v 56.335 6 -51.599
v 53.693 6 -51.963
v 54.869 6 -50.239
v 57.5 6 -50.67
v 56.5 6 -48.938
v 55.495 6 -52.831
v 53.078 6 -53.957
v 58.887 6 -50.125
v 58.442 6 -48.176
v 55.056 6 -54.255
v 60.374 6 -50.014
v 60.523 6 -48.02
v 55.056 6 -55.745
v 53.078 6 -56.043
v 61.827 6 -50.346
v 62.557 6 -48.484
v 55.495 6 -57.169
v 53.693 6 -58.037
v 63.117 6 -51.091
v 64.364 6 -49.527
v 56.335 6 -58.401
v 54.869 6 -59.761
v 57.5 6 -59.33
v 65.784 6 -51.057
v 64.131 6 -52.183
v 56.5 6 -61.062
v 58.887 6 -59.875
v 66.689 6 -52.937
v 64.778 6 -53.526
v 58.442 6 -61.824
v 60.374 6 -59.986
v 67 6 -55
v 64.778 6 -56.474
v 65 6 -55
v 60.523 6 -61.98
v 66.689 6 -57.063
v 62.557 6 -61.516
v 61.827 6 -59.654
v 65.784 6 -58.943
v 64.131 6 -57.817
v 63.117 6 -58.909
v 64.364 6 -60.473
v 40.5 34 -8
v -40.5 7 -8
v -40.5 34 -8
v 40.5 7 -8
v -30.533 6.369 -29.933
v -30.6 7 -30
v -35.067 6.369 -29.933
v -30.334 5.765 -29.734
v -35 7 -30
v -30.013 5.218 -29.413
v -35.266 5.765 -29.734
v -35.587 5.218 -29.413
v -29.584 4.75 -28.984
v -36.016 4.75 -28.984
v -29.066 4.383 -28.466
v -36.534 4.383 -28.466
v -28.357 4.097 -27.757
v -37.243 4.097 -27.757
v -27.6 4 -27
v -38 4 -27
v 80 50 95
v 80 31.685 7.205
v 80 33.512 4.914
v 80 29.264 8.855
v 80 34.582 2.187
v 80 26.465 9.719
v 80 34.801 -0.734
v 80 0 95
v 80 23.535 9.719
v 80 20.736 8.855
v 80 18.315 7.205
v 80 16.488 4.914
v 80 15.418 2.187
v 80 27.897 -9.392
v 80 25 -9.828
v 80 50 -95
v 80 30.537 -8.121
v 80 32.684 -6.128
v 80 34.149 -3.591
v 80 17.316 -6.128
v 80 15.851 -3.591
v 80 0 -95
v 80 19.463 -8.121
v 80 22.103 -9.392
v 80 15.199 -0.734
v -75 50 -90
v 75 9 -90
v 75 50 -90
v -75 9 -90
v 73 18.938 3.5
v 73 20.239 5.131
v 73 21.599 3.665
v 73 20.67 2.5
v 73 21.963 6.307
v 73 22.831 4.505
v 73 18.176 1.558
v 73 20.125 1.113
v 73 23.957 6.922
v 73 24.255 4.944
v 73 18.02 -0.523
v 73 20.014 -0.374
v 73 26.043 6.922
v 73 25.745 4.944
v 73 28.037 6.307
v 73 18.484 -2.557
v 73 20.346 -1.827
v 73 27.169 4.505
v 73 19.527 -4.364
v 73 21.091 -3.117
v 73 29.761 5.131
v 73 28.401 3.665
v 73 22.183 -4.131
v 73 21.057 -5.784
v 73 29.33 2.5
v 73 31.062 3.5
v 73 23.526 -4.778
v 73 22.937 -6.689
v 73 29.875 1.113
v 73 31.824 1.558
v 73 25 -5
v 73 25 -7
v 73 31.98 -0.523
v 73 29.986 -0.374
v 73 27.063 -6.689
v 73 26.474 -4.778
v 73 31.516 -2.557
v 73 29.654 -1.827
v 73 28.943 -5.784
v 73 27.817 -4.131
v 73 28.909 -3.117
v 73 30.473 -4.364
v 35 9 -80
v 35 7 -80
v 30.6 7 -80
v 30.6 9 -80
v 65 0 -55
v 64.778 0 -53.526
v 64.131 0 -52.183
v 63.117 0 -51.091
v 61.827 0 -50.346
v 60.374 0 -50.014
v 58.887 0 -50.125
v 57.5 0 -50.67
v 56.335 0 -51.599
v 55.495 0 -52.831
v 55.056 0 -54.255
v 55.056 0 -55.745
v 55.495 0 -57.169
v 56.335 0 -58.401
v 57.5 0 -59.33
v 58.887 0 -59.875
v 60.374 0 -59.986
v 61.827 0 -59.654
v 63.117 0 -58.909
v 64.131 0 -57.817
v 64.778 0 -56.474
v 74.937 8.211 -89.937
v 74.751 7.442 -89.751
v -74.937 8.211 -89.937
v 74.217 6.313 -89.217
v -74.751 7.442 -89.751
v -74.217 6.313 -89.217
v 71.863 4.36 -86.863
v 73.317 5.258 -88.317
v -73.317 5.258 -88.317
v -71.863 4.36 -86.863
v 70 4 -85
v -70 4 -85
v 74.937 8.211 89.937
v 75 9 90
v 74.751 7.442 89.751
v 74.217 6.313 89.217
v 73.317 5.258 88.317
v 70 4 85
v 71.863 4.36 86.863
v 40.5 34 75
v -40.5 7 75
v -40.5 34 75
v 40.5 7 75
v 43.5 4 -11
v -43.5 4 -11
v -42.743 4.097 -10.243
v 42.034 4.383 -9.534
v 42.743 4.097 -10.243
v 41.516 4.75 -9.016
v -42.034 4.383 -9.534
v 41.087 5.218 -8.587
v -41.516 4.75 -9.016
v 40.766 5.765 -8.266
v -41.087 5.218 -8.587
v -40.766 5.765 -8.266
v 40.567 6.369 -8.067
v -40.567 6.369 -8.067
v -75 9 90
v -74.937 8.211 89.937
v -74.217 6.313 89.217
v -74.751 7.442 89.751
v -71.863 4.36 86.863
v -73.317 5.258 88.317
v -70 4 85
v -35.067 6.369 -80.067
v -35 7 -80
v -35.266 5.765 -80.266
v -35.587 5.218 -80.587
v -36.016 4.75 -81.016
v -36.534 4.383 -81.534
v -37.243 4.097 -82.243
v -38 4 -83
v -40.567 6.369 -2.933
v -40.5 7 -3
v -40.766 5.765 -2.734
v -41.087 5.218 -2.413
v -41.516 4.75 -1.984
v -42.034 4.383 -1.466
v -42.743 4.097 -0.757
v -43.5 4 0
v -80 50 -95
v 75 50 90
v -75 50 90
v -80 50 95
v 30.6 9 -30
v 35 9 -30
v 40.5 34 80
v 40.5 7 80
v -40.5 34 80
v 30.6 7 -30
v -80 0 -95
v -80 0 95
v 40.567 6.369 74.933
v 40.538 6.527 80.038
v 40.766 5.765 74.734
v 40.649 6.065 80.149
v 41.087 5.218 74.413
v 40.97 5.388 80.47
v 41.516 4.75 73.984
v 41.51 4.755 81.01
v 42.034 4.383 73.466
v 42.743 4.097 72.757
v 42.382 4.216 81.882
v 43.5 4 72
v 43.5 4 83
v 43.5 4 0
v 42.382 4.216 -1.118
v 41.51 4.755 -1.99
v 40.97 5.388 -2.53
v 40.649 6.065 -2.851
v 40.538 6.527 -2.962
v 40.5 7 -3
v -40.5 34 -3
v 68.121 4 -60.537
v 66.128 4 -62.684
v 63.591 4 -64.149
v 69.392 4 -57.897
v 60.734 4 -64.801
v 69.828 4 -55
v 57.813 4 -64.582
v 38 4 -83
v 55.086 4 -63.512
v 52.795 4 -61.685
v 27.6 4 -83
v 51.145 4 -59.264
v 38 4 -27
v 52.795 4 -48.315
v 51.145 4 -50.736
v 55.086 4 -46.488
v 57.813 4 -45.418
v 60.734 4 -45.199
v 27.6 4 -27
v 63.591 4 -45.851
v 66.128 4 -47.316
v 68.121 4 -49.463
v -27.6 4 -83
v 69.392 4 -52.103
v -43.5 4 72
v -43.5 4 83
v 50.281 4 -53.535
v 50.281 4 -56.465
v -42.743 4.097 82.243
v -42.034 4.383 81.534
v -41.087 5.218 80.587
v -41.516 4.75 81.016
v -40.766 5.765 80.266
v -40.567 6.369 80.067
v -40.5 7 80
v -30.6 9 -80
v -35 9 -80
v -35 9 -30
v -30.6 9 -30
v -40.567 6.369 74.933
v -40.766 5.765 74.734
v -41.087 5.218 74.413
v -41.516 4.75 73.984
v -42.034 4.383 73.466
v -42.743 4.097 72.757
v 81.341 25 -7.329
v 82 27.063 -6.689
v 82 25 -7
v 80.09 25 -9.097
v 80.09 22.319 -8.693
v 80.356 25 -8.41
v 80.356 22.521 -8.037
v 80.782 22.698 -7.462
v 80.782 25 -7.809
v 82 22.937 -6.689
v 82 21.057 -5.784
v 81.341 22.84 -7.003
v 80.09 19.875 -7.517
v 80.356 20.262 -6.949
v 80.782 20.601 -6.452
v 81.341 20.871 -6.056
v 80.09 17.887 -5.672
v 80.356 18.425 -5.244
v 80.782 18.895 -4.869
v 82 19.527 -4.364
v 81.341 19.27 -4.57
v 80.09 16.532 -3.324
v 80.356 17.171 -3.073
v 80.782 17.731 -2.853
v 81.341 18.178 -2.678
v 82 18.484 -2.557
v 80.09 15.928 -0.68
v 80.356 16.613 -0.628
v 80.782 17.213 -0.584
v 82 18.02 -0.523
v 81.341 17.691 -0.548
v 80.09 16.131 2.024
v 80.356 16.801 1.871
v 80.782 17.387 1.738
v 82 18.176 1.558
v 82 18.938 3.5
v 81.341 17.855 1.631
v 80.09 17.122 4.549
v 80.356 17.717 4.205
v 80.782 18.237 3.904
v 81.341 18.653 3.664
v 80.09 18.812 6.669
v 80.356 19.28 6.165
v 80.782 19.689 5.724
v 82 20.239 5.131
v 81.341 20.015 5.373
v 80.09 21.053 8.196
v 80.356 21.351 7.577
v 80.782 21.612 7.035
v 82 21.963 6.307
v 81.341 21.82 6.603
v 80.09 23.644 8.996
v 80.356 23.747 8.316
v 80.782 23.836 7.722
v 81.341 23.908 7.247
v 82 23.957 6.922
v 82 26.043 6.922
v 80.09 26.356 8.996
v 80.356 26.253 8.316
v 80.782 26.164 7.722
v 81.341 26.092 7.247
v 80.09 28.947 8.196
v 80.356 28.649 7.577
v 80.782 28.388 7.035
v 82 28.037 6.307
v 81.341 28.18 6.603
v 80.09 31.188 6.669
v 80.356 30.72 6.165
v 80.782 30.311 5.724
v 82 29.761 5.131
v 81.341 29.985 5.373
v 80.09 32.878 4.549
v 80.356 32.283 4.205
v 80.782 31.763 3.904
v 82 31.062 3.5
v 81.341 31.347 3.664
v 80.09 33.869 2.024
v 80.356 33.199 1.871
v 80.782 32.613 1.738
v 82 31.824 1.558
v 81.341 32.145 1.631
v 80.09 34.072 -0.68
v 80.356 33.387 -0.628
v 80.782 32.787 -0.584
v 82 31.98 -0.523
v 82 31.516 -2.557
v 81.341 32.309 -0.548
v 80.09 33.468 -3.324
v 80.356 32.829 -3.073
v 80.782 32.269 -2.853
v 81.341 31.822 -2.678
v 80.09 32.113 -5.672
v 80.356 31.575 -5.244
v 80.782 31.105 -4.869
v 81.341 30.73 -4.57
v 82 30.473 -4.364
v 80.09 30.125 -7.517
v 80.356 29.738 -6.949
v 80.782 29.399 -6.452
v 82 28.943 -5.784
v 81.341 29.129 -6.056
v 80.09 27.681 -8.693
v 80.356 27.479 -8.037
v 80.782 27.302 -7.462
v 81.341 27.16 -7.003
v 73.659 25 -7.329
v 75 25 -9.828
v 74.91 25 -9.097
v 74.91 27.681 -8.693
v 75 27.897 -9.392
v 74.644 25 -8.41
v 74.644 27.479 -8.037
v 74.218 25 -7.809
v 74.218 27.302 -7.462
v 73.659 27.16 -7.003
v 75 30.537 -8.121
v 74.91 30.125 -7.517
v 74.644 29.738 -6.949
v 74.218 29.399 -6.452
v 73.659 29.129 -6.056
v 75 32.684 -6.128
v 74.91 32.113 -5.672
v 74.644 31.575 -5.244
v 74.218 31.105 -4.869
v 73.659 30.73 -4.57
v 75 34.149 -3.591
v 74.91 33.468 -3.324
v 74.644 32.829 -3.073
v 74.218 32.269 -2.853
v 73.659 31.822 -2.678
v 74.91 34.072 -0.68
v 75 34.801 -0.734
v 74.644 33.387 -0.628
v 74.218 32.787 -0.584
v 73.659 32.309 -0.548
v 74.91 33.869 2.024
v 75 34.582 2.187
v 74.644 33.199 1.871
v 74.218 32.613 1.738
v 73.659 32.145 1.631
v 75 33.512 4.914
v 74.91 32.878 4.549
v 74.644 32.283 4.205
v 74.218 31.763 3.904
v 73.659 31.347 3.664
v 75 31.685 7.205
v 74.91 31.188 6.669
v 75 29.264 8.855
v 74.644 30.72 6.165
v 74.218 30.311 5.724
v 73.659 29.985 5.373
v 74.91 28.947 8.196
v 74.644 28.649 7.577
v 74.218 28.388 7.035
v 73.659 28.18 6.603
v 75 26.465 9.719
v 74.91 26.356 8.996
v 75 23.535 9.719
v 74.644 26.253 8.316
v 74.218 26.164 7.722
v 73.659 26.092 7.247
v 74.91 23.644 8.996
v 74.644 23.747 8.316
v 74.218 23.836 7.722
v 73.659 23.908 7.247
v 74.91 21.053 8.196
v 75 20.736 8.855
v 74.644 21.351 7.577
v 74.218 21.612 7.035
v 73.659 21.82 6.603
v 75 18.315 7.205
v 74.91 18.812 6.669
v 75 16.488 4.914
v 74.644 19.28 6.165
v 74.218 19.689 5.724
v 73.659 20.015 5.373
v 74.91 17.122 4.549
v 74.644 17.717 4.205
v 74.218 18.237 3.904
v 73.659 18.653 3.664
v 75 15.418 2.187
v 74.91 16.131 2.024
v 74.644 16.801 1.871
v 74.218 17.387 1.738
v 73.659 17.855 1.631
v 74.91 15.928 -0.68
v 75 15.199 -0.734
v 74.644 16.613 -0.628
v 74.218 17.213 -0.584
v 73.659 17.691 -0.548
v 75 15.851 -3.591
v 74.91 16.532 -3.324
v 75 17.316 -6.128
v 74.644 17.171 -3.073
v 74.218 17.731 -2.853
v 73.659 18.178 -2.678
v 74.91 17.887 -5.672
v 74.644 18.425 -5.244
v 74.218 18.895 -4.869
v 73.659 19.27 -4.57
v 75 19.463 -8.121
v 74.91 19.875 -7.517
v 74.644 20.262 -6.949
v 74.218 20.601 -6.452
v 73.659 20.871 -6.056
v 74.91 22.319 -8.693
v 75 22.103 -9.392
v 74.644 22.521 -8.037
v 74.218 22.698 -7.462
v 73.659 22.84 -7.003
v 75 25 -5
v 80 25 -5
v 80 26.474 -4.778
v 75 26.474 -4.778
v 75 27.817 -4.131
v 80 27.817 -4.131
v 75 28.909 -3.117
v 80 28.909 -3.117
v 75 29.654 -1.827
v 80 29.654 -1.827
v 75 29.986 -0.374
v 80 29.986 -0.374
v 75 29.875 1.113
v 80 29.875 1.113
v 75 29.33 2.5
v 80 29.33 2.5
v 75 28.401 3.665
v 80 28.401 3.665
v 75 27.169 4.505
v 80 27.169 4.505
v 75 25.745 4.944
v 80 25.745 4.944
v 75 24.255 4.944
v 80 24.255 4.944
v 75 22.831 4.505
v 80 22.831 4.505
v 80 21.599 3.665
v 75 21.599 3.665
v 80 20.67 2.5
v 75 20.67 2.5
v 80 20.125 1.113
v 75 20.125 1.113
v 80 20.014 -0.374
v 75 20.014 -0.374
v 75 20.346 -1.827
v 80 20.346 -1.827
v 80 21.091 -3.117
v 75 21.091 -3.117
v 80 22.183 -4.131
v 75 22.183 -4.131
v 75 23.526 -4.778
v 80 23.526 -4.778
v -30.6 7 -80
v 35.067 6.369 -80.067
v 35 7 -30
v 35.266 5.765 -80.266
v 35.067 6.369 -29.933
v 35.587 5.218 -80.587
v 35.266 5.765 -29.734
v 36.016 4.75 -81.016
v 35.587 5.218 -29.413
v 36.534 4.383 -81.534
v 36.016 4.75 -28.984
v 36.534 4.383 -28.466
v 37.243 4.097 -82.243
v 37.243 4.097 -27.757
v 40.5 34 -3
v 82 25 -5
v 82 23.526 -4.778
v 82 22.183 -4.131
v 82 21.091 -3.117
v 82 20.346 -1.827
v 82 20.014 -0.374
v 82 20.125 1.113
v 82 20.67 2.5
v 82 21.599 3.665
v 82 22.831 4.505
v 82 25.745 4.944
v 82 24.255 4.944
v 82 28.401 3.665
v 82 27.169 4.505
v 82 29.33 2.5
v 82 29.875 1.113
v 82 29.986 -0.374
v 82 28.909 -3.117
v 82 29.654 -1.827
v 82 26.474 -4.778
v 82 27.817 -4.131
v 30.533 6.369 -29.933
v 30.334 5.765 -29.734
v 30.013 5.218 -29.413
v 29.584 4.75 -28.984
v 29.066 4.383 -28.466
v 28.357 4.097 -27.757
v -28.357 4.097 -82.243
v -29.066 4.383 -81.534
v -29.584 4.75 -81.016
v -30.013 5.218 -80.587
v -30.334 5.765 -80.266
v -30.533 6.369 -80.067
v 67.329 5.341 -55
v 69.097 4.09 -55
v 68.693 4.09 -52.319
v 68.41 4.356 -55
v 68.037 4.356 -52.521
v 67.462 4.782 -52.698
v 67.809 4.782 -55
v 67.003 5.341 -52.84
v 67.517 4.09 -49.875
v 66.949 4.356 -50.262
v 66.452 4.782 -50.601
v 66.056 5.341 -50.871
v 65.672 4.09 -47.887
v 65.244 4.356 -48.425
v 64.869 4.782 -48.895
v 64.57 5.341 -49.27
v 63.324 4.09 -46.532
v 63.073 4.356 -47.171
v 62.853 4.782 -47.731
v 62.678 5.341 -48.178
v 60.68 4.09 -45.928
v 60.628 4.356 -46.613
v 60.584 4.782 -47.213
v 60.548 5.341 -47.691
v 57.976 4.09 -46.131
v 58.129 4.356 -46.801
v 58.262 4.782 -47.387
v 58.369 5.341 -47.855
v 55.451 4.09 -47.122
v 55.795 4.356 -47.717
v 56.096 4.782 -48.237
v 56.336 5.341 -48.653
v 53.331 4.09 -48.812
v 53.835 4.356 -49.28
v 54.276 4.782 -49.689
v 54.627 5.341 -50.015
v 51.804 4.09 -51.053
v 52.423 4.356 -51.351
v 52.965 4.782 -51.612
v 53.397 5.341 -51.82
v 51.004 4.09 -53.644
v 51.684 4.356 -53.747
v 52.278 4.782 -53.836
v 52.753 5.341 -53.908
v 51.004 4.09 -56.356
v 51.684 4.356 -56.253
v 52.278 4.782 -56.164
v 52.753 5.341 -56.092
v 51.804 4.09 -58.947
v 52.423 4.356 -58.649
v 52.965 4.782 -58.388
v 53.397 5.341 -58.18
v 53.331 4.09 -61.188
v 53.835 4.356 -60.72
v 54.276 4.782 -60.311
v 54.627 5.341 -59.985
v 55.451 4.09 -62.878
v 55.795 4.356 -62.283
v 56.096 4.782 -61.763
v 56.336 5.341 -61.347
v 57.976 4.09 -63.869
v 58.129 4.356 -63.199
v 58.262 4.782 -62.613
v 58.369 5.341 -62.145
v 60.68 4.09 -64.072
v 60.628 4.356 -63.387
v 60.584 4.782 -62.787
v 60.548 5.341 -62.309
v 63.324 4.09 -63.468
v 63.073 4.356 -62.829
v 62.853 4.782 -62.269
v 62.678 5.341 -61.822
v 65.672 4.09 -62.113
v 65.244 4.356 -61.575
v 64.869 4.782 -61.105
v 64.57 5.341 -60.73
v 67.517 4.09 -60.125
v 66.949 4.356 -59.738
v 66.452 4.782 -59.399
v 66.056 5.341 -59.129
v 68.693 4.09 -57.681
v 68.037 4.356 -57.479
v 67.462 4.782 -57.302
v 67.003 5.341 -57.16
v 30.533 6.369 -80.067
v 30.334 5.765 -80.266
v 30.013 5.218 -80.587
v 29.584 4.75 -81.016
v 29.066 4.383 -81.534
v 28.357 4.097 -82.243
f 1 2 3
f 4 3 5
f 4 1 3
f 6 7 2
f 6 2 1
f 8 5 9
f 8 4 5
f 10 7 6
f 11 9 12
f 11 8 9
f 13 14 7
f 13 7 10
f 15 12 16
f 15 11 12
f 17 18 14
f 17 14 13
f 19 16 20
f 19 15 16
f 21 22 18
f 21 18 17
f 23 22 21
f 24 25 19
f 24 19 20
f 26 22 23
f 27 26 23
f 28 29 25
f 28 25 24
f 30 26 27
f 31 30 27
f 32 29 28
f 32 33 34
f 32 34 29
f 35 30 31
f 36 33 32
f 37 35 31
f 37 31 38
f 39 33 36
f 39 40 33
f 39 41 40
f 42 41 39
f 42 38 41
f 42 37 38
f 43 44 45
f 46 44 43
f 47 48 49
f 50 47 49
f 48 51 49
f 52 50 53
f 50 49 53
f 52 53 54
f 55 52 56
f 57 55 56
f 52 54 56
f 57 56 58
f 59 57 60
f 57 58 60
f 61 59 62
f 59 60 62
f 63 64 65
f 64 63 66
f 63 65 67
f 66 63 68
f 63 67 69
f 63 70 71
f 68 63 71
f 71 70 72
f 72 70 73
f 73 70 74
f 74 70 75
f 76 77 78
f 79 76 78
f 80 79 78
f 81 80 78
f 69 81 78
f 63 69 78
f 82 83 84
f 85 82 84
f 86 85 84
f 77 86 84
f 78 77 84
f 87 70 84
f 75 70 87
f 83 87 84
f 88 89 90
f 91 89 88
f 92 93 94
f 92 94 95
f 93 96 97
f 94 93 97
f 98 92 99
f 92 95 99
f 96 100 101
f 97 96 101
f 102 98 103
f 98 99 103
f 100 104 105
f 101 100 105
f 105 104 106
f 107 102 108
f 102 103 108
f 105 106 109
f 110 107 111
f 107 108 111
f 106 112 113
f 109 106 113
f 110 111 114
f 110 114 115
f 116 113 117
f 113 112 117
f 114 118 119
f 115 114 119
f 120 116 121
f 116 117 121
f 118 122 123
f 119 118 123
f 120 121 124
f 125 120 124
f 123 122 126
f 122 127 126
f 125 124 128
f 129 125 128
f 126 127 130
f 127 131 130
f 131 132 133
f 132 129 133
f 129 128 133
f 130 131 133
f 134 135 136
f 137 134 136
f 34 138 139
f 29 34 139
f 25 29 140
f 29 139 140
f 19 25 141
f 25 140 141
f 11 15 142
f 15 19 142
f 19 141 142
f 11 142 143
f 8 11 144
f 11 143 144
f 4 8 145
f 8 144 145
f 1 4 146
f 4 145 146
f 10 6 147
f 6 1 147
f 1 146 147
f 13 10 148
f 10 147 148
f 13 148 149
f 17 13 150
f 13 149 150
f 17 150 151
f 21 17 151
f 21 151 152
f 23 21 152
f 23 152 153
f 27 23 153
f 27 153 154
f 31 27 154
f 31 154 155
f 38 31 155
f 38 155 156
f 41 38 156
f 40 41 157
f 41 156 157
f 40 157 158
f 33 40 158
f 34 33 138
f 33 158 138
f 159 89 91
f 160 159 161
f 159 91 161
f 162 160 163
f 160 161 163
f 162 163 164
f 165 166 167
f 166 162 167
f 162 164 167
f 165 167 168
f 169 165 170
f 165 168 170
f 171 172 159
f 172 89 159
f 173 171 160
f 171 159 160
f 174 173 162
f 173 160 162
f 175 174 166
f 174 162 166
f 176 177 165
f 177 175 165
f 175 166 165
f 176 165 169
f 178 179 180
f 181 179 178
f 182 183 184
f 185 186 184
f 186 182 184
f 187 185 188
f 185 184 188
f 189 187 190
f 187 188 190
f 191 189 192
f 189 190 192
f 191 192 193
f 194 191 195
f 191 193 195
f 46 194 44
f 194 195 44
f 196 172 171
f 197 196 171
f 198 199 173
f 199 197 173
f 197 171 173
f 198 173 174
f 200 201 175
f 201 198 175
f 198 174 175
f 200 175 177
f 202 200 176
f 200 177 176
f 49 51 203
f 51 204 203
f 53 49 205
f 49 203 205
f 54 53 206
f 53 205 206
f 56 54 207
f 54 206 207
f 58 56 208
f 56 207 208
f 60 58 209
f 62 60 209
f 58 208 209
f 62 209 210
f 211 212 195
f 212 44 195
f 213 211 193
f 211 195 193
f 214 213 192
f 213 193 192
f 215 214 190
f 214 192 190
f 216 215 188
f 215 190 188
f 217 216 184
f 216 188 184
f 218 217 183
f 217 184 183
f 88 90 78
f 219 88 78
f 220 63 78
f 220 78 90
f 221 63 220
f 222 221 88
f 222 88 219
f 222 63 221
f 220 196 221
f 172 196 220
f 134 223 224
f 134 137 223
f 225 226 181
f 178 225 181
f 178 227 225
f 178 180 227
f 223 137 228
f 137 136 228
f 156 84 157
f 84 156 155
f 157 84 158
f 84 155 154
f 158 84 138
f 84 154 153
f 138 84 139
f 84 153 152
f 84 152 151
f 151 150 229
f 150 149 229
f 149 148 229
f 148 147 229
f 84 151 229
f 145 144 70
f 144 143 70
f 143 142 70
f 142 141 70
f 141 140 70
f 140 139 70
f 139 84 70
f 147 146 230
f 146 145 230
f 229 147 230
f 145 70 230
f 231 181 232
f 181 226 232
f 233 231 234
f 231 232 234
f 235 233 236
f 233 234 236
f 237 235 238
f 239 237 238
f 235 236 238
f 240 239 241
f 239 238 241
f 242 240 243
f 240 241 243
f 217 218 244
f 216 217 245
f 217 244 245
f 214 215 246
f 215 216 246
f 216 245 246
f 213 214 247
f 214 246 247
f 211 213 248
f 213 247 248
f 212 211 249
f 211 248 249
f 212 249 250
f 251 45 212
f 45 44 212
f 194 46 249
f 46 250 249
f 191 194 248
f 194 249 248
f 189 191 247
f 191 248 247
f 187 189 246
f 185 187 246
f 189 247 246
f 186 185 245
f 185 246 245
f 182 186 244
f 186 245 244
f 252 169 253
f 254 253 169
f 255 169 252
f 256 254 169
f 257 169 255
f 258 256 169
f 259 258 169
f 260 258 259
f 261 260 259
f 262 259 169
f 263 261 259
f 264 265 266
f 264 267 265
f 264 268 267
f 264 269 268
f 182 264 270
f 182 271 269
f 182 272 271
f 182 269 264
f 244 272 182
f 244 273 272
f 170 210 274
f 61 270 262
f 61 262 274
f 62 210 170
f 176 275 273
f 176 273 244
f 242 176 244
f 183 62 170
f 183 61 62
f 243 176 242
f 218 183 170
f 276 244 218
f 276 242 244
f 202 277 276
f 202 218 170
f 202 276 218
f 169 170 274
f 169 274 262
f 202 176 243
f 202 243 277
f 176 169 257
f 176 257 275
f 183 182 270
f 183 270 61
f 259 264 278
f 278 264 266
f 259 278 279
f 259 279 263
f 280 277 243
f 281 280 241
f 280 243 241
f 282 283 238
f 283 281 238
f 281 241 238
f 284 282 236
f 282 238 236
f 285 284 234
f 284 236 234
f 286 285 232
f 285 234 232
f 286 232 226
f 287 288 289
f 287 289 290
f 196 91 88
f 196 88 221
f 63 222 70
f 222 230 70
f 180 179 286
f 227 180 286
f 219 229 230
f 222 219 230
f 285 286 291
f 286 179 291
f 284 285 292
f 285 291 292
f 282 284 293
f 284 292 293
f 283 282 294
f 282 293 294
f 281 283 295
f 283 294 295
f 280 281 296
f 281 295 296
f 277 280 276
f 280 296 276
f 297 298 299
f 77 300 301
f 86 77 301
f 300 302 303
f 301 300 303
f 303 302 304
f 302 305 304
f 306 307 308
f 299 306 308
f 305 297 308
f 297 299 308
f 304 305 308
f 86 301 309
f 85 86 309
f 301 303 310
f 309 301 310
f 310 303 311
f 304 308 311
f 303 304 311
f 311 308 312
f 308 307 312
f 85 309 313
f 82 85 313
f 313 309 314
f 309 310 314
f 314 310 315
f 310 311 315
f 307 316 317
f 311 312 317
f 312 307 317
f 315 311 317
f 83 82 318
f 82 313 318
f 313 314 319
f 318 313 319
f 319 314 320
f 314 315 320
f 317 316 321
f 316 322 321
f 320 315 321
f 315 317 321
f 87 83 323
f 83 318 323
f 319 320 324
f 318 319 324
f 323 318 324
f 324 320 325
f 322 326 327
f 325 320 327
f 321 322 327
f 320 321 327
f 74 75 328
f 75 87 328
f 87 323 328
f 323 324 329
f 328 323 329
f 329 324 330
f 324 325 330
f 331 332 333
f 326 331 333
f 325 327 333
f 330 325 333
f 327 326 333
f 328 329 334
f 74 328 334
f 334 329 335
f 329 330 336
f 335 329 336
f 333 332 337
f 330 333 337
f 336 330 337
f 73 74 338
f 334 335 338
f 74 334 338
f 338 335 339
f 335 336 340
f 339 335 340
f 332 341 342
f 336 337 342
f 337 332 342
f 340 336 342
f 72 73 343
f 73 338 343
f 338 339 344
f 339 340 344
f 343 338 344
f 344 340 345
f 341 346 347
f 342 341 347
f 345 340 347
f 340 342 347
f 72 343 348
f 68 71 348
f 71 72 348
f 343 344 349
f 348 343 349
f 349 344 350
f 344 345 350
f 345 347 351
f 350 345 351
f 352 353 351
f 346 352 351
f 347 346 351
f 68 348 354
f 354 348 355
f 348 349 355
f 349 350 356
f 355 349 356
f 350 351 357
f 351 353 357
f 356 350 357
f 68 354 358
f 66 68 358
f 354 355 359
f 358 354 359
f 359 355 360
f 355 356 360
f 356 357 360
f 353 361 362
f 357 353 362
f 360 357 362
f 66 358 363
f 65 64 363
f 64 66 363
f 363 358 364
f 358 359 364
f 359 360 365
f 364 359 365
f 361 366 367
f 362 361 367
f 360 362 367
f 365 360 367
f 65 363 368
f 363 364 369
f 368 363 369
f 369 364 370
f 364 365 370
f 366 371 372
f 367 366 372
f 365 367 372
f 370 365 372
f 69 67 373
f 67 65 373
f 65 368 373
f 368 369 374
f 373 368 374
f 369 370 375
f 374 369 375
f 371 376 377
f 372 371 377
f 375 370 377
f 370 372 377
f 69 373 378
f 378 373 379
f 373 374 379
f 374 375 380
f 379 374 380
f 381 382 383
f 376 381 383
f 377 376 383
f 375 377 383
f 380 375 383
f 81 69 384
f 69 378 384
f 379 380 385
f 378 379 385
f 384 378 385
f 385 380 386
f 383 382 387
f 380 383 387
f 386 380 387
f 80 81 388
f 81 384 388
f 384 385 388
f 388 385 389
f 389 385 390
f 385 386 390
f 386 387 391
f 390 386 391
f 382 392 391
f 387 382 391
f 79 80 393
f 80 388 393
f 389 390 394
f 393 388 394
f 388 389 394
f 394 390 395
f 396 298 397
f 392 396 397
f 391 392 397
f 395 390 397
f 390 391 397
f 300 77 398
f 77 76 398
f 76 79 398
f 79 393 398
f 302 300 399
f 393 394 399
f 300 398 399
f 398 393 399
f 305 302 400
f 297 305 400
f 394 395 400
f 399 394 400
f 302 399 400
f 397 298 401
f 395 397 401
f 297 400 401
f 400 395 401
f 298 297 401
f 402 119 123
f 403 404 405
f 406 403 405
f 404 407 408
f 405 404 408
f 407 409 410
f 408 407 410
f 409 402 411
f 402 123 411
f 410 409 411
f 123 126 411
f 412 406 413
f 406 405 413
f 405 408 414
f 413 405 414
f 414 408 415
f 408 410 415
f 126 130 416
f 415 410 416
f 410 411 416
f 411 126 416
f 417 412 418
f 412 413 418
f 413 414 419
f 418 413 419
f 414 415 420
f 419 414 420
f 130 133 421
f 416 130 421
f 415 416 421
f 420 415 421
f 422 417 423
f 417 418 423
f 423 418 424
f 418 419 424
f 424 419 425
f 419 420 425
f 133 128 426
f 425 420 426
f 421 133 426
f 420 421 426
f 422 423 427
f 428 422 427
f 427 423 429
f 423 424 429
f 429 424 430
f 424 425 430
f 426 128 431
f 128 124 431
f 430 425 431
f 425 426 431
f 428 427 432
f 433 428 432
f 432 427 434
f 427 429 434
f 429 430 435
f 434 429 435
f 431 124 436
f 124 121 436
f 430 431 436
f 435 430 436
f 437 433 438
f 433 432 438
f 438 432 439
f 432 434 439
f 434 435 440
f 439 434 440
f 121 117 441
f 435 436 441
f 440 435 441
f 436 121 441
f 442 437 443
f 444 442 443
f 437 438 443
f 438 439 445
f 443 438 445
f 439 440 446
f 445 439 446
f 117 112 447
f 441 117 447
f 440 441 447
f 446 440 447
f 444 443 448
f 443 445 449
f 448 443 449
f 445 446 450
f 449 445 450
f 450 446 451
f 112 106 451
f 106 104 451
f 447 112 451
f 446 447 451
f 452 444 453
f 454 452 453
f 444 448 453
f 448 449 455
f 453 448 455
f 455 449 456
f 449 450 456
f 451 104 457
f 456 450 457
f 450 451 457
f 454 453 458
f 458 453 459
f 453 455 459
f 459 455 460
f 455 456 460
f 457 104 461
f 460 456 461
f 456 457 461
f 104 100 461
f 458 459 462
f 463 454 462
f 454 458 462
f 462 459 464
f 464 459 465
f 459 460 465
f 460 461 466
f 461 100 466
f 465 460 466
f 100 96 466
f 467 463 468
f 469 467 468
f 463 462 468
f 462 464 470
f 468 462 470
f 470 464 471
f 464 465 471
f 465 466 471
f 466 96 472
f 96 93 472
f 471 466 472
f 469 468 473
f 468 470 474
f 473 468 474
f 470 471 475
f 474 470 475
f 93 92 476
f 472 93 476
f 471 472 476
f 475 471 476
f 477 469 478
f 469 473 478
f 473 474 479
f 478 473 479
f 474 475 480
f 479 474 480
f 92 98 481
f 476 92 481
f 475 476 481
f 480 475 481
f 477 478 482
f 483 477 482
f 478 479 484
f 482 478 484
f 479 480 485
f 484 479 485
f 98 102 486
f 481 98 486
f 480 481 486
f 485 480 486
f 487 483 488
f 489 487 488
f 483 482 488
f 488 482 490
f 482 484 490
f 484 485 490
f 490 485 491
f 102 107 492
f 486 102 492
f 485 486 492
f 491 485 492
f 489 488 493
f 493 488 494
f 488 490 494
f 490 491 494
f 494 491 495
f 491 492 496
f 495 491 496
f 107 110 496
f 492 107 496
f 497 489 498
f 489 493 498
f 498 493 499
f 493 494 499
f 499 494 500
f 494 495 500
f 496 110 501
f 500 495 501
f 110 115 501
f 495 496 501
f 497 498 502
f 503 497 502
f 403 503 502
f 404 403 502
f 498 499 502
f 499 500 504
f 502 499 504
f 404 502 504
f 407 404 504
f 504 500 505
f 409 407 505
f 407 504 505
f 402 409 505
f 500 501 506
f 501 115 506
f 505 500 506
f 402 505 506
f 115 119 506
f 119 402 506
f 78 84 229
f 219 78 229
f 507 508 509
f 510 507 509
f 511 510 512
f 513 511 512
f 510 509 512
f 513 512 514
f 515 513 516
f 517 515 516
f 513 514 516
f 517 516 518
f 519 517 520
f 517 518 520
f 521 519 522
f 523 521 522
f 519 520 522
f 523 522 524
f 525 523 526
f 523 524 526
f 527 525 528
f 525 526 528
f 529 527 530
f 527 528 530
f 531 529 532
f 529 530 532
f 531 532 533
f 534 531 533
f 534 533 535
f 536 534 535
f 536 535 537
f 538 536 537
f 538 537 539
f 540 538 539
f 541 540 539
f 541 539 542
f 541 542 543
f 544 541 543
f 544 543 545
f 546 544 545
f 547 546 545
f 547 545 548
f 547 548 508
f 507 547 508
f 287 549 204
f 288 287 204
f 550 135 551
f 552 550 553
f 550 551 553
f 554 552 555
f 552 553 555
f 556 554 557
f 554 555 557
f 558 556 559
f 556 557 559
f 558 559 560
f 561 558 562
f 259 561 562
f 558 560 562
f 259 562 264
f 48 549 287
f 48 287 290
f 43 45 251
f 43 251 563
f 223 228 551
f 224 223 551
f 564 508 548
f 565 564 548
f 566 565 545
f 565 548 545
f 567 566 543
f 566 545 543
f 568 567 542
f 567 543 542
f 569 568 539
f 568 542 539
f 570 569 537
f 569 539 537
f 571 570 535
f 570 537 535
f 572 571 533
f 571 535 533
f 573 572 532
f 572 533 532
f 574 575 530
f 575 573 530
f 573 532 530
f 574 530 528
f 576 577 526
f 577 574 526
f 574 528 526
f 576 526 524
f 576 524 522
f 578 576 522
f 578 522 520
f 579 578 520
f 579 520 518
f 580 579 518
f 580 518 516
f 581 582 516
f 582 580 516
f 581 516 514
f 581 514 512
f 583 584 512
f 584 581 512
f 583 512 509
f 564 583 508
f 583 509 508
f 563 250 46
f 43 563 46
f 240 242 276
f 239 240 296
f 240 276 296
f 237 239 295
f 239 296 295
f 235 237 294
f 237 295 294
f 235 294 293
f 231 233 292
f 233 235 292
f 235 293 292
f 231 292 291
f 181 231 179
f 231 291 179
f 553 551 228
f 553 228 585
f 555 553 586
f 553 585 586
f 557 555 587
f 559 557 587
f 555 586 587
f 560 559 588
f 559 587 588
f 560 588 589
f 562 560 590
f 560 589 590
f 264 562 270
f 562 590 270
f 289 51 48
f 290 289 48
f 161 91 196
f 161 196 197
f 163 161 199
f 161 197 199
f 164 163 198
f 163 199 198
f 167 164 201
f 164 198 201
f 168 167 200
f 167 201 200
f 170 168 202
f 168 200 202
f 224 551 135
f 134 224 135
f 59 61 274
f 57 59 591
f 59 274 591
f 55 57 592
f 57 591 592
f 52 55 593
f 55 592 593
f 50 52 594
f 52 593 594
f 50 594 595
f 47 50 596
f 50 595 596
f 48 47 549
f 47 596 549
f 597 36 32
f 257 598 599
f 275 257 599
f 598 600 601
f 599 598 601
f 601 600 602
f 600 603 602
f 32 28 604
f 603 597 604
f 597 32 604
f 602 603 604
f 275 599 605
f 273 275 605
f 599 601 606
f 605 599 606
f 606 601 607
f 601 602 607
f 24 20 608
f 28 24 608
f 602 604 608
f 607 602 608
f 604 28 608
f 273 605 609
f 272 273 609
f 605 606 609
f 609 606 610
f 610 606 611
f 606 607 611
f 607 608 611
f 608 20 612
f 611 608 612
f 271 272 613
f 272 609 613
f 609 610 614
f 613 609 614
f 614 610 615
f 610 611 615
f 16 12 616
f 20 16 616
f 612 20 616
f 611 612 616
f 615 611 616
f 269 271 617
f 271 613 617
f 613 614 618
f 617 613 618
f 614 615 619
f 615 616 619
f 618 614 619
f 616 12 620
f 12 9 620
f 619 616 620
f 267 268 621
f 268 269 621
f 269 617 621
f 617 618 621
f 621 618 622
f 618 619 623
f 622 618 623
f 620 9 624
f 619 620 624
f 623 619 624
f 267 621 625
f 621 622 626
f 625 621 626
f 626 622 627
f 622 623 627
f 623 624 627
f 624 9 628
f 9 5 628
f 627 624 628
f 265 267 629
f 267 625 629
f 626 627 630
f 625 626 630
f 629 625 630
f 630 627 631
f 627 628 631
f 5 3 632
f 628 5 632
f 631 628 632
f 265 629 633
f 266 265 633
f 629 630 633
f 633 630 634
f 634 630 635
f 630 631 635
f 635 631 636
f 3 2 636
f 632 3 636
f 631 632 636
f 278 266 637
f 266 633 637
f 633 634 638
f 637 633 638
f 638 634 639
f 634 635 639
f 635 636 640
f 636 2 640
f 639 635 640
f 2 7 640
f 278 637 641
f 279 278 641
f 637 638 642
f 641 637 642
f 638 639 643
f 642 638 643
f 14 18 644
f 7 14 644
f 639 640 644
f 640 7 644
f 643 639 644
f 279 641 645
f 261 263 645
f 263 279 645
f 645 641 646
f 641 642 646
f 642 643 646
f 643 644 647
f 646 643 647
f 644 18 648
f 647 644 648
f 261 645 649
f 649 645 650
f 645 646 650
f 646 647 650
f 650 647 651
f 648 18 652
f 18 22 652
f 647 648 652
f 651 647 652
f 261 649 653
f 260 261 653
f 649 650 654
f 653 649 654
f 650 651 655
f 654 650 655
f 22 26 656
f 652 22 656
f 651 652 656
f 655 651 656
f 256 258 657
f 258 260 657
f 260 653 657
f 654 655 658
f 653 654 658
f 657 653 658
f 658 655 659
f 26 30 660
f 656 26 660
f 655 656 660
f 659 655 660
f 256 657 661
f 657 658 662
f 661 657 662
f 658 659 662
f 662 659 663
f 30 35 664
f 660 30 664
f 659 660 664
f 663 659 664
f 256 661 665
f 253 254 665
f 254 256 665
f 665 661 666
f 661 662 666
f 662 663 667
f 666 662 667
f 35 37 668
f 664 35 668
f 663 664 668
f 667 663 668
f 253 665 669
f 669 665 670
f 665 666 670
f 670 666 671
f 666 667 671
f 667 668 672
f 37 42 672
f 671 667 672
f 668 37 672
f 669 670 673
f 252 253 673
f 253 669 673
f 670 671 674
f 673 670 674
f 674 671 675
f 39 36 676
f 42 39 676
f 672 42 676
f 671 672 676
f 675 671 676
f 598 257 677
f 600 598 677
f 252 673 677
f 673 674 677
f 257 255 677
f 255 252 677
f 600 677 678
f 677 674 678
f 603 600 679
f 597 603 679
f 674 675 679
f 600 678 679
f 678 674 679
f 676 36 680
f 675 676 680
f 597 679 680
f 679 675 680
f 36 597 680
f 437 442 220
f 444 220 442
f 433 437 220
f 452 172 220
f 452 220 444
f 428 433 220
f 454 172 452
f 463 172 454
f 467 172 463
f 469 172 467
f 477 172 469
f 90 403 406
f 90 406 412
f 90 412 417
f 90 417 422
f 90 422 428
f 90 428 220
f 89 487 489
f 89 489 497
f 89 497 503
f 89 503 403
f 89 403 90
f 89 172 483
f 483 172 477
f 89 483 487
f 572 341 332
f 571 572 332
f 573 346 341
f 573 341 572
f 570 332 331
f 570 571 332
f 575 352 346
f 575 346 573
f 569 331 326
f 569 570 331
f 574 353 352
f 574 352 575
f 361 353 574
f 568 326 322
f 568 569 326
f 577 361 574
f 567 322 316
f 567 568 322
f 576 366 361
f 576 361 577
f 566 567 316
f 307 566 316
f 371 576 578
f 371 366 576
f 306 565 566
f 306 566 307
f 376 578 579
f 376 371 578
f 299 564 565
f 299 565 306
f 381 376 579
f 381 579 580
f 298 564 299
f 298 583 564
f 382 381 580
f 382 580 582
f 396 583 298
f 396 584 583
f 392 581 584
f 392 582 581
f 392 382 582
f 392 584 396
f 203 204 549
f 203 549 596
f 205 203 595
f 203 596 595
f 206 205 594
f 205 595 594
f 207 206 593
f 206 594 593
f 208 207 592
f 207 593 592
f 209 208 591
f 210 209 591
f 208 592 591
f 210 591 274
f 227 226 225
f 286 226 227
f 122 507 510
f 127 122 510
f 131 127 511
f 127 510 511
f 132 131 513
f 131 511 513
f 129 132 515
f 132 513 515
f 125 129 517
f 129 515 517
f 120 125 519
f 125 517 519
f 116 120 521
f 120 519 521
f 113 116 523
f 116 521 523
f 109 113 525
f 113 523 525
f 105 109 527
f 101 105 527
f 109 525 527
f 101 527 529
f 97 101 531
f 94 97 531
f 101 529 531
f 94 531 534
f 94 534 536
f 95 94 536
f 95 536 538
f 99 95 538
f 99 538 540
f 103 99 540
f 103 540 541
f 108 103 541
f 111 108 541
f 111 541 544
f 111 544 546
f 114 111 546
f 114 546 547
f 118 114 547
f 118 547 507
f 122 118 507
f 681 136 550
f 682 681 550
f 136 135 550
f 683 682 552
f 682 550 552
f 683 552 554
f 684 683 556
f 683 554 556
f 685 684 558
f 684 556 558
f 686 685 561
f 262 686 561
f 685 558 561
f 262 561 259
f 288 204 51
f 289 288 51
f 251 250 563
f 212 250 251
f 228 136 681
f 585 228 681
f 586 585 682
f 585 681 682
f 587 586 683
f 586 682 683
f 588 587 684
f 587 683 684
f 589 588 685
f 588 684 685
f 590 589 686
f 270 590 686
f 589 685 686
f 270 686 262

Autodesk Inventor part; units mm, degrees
ref_plane "YZ Plane" through (0, 0, 0) normal (1, 0, 0) x (0, 1, 0)
ref_plane "XZ Plane" through (0, 0, 0) normal (0, 1, 0) x (-1, 0, 0)
ref_plane "XY Plane" through (0, 0, 0) normal (0, 0, 1) x (1, 0, 0)
sketch "Esboço1" plane through (0, 0, 0) normal (0, 1, 0) x (-1, 0, 0)
  line L0 (75, 90) -> (-75, 90)
  line L1 (-75, 90) -> (-75, -90)
  line L2 (-75, -90) -> (75, -90)
  line L3 (75, -90) -> (75, 90)
  line L4 (75, 90) -> (-75, -90) construction
  line L5 (-75, 90) -> (75, -90) construction
  line L6 (50.5, 80) -> (-50.5, 80) construction
  line L7 (-50.5, 80) -> (-50.5, -8) construction
  line L8 (-50.5, -8) -> (50.5, -8) construction
  line L9 (50.5, -8) -> (50.5, 80) construction
  line L10 (50.5, 80) -> (-50.5, -8) construction
  line L11 (-50.5, 80) -> (50.5, -8) construction
  line L12 (35, -30) -> (-35, -30) construction
  line L13 (-35, -30) -> (-35, -80) construction
  line L14 (-35, -80) -> (35, -80) construction
  line L15 (35, -80) -> (35, -30) construction
  line L16 (35, -30) -> (-35, -80) construction
  line L17 (-35, -30) -> (35, -80) construction
  line L18 (0, 90) -> (0, -90) construction
  line L19 (80, 95) -> (-80, 95)
  line L20 (-80, 95) -> (-80, -95)
  line L21 (-80, -95) -> (80, -95)
  line L22 (80, -95) -> (80, 95)
  point P0 (0, 0)
  point P1 (0, 36)
  point P2 (0, -55)
  dimension "d0" = 150
  dimension "d1" = 180
  dimension "d2" = 101
  dimension "d3" = 88
  dimension "d4" = 70
  dimension "d5" = 50
  dimension "d6" = 10
  dimension "d7" = 10
  dimension "d8" = 5
extrude "Extrusão1" add sketch "Esboço1" along normal blind 50
extrude "Extrusion2" add sketch "Esboço1" along normal blind 4 contours L3 L2 L1 L0
sketch "SaidaCarga" plane through (80, 0, 95) normal (1, 0, 0) x (0, 0, -1)
  line L0 (0, 50) -> (190, 50) projected
  line L1 (0, 50) -> (190, 0) construction
  circle A0 centre (95, 25) radius 5
  circle A1 centre (95, 25) radius 7
  point P0 (95, 0)
  dimension "d13" = 10
  dimension "d14" = 2
sketch "Sketch3" plane through (0, 4, 0) normal (0, 1, 0) x (1, 0, 0)
  line L0 (-50.5, -80) -> (50.5, -80) construction
  line L1 (50.5, -80) -> (50.5, 8) construction
  line L2 (-50.5, 8) -> (-50.5, -80) construction
  line L3 (50.5, 8) -> (-50.5, 8) construction
  line L4 (-35, 30) -> (35, 30) construction
  line L5 (35, 30) -> (35, 80) construction
  line L6 (35, 80) -> (-35, 80) construction
  line L7 (-35, 80) -> (-35, 30) construction
  circle A0 centre (60, 55) radius 5
  circle A1 centre (60, 55) radius 7
  line L8 (75, 90) -> (75, -90) projected
  line L9 (-75, 90) -> (75, 90) projected
  line L10 (-35, 30) -> (35, 30)
  line L11 (35, 30) -> (35, 80)
  line L12 (35, 80) -> (-35, 80)
  line L13 (-35, 80) -> (-35, 30)
  circle A2 centre (-32.8, 32.2) radius 1.1
  line L14 (-35, 55) -> (35, 55) construction
  circle A3 centre (-32.8, 77.8) radius 1.1
  line L15 (0, 30) -> (0, 80) construction
  circle A4 centre (32.8, 32.2) radius 1.1
  circle A5 centre (32.8, 77.8) radius 1.1
  line L16 (-30.6, 34.4) -> (-35, 30) construction
  line L17 (-35, 34.4) -> (-30.6, 30) construction
  line L18 (-30.6, 80) -> (-30.6, 30)
  line L19 (30.6, 80) -> (30.6, 30)
  line L20 (-50.5, -75) -> (50.5, -75)
  line L21 (-40.5, 8) -> (-40.5, -80)
  line L22 (50.5, 3) -> (-50.5, 3)
  line L23 (40.5, -80) -> (40.5, 8)
  line L24 (-50.5, 8) -> (50.5, 8)
  line L25 (50.5, 8) -> (50.5, -80)
  line L26 (50.5, -80) -> (-50.5, -80)
  line L27 (-50.5, -80) -> (-50.5, 8)
  point P0 (0, 0)
  point P1 (30.6, 30)
  point P2 (40.5, 8)
  point P3 (-40.5, 3)
  point P4 (40.5, 3)
  point P5 (40.5, -75)
  point P6 (-40.5, -75)
  dimension "d15" = 10
  dimension "d16" = 2
  dimension "d17" = 15
  dimension "d18" = 35
  dimension "d29" = 2.2
  dimension "d30" = 2.2
  dimension "d31" = 2.2
  dimension "d32" = 4.4
  dimension "d35" = 5
  dimension "d36" = 10
  dimension "d37" = 5
  dimension "d38" = 10
extrude "Extrusion3" cut sketch "Sketch3" against normal blind 4 contours A0
extrude "Extrusion4" add sketch "Sketch3" along normal blind 2 contours A1
extrude "Extrusion5" cut sketch "SaidaCarga" against normal blind 5 contours A0
extrude "Extrusion6" add sketch "SaidaCarga" along normal blind 2 and the other way blind 7
extrude "Extrusion7" add sketch "Sketch3" along normal blind 5 contours L13 L12 L18 L10 | L19 L12 L11 L10 | A2 | A3 | A4 | A5
extrude "Extrusion8" add sketch "Sketch3" along normal blind 30 contours L20 L23 L26 L21 | L21 L24 L23 L22
fillet "Fillet1" radius 5 4 edges at (0, 4, -90) (-75, 4, 0) (0, 4, 90) (75, 4, 0)
fillet "Fillet2" radius 3 19 edges at (0, 4, -3) (40.5, 4, -5.5) (0, 4, -8) (-40.5, 4, -5.5) (0, 4, 75) (-40.5, 4, 77.5) (0, 4, 80) (40.5, 4, 77.5) (35, 4, -55) (30.6, 4, -55) (32.8, 4, -30) (32.8, 4, -80) (-30.6, 4, -55) (-32.8, 4, -30) (-35, 4, -55) (-32.8, 4, -80) (80, 25, 7) (75, 25, 7) (53, 4, -55)
properties part number "CaseBitDog"
